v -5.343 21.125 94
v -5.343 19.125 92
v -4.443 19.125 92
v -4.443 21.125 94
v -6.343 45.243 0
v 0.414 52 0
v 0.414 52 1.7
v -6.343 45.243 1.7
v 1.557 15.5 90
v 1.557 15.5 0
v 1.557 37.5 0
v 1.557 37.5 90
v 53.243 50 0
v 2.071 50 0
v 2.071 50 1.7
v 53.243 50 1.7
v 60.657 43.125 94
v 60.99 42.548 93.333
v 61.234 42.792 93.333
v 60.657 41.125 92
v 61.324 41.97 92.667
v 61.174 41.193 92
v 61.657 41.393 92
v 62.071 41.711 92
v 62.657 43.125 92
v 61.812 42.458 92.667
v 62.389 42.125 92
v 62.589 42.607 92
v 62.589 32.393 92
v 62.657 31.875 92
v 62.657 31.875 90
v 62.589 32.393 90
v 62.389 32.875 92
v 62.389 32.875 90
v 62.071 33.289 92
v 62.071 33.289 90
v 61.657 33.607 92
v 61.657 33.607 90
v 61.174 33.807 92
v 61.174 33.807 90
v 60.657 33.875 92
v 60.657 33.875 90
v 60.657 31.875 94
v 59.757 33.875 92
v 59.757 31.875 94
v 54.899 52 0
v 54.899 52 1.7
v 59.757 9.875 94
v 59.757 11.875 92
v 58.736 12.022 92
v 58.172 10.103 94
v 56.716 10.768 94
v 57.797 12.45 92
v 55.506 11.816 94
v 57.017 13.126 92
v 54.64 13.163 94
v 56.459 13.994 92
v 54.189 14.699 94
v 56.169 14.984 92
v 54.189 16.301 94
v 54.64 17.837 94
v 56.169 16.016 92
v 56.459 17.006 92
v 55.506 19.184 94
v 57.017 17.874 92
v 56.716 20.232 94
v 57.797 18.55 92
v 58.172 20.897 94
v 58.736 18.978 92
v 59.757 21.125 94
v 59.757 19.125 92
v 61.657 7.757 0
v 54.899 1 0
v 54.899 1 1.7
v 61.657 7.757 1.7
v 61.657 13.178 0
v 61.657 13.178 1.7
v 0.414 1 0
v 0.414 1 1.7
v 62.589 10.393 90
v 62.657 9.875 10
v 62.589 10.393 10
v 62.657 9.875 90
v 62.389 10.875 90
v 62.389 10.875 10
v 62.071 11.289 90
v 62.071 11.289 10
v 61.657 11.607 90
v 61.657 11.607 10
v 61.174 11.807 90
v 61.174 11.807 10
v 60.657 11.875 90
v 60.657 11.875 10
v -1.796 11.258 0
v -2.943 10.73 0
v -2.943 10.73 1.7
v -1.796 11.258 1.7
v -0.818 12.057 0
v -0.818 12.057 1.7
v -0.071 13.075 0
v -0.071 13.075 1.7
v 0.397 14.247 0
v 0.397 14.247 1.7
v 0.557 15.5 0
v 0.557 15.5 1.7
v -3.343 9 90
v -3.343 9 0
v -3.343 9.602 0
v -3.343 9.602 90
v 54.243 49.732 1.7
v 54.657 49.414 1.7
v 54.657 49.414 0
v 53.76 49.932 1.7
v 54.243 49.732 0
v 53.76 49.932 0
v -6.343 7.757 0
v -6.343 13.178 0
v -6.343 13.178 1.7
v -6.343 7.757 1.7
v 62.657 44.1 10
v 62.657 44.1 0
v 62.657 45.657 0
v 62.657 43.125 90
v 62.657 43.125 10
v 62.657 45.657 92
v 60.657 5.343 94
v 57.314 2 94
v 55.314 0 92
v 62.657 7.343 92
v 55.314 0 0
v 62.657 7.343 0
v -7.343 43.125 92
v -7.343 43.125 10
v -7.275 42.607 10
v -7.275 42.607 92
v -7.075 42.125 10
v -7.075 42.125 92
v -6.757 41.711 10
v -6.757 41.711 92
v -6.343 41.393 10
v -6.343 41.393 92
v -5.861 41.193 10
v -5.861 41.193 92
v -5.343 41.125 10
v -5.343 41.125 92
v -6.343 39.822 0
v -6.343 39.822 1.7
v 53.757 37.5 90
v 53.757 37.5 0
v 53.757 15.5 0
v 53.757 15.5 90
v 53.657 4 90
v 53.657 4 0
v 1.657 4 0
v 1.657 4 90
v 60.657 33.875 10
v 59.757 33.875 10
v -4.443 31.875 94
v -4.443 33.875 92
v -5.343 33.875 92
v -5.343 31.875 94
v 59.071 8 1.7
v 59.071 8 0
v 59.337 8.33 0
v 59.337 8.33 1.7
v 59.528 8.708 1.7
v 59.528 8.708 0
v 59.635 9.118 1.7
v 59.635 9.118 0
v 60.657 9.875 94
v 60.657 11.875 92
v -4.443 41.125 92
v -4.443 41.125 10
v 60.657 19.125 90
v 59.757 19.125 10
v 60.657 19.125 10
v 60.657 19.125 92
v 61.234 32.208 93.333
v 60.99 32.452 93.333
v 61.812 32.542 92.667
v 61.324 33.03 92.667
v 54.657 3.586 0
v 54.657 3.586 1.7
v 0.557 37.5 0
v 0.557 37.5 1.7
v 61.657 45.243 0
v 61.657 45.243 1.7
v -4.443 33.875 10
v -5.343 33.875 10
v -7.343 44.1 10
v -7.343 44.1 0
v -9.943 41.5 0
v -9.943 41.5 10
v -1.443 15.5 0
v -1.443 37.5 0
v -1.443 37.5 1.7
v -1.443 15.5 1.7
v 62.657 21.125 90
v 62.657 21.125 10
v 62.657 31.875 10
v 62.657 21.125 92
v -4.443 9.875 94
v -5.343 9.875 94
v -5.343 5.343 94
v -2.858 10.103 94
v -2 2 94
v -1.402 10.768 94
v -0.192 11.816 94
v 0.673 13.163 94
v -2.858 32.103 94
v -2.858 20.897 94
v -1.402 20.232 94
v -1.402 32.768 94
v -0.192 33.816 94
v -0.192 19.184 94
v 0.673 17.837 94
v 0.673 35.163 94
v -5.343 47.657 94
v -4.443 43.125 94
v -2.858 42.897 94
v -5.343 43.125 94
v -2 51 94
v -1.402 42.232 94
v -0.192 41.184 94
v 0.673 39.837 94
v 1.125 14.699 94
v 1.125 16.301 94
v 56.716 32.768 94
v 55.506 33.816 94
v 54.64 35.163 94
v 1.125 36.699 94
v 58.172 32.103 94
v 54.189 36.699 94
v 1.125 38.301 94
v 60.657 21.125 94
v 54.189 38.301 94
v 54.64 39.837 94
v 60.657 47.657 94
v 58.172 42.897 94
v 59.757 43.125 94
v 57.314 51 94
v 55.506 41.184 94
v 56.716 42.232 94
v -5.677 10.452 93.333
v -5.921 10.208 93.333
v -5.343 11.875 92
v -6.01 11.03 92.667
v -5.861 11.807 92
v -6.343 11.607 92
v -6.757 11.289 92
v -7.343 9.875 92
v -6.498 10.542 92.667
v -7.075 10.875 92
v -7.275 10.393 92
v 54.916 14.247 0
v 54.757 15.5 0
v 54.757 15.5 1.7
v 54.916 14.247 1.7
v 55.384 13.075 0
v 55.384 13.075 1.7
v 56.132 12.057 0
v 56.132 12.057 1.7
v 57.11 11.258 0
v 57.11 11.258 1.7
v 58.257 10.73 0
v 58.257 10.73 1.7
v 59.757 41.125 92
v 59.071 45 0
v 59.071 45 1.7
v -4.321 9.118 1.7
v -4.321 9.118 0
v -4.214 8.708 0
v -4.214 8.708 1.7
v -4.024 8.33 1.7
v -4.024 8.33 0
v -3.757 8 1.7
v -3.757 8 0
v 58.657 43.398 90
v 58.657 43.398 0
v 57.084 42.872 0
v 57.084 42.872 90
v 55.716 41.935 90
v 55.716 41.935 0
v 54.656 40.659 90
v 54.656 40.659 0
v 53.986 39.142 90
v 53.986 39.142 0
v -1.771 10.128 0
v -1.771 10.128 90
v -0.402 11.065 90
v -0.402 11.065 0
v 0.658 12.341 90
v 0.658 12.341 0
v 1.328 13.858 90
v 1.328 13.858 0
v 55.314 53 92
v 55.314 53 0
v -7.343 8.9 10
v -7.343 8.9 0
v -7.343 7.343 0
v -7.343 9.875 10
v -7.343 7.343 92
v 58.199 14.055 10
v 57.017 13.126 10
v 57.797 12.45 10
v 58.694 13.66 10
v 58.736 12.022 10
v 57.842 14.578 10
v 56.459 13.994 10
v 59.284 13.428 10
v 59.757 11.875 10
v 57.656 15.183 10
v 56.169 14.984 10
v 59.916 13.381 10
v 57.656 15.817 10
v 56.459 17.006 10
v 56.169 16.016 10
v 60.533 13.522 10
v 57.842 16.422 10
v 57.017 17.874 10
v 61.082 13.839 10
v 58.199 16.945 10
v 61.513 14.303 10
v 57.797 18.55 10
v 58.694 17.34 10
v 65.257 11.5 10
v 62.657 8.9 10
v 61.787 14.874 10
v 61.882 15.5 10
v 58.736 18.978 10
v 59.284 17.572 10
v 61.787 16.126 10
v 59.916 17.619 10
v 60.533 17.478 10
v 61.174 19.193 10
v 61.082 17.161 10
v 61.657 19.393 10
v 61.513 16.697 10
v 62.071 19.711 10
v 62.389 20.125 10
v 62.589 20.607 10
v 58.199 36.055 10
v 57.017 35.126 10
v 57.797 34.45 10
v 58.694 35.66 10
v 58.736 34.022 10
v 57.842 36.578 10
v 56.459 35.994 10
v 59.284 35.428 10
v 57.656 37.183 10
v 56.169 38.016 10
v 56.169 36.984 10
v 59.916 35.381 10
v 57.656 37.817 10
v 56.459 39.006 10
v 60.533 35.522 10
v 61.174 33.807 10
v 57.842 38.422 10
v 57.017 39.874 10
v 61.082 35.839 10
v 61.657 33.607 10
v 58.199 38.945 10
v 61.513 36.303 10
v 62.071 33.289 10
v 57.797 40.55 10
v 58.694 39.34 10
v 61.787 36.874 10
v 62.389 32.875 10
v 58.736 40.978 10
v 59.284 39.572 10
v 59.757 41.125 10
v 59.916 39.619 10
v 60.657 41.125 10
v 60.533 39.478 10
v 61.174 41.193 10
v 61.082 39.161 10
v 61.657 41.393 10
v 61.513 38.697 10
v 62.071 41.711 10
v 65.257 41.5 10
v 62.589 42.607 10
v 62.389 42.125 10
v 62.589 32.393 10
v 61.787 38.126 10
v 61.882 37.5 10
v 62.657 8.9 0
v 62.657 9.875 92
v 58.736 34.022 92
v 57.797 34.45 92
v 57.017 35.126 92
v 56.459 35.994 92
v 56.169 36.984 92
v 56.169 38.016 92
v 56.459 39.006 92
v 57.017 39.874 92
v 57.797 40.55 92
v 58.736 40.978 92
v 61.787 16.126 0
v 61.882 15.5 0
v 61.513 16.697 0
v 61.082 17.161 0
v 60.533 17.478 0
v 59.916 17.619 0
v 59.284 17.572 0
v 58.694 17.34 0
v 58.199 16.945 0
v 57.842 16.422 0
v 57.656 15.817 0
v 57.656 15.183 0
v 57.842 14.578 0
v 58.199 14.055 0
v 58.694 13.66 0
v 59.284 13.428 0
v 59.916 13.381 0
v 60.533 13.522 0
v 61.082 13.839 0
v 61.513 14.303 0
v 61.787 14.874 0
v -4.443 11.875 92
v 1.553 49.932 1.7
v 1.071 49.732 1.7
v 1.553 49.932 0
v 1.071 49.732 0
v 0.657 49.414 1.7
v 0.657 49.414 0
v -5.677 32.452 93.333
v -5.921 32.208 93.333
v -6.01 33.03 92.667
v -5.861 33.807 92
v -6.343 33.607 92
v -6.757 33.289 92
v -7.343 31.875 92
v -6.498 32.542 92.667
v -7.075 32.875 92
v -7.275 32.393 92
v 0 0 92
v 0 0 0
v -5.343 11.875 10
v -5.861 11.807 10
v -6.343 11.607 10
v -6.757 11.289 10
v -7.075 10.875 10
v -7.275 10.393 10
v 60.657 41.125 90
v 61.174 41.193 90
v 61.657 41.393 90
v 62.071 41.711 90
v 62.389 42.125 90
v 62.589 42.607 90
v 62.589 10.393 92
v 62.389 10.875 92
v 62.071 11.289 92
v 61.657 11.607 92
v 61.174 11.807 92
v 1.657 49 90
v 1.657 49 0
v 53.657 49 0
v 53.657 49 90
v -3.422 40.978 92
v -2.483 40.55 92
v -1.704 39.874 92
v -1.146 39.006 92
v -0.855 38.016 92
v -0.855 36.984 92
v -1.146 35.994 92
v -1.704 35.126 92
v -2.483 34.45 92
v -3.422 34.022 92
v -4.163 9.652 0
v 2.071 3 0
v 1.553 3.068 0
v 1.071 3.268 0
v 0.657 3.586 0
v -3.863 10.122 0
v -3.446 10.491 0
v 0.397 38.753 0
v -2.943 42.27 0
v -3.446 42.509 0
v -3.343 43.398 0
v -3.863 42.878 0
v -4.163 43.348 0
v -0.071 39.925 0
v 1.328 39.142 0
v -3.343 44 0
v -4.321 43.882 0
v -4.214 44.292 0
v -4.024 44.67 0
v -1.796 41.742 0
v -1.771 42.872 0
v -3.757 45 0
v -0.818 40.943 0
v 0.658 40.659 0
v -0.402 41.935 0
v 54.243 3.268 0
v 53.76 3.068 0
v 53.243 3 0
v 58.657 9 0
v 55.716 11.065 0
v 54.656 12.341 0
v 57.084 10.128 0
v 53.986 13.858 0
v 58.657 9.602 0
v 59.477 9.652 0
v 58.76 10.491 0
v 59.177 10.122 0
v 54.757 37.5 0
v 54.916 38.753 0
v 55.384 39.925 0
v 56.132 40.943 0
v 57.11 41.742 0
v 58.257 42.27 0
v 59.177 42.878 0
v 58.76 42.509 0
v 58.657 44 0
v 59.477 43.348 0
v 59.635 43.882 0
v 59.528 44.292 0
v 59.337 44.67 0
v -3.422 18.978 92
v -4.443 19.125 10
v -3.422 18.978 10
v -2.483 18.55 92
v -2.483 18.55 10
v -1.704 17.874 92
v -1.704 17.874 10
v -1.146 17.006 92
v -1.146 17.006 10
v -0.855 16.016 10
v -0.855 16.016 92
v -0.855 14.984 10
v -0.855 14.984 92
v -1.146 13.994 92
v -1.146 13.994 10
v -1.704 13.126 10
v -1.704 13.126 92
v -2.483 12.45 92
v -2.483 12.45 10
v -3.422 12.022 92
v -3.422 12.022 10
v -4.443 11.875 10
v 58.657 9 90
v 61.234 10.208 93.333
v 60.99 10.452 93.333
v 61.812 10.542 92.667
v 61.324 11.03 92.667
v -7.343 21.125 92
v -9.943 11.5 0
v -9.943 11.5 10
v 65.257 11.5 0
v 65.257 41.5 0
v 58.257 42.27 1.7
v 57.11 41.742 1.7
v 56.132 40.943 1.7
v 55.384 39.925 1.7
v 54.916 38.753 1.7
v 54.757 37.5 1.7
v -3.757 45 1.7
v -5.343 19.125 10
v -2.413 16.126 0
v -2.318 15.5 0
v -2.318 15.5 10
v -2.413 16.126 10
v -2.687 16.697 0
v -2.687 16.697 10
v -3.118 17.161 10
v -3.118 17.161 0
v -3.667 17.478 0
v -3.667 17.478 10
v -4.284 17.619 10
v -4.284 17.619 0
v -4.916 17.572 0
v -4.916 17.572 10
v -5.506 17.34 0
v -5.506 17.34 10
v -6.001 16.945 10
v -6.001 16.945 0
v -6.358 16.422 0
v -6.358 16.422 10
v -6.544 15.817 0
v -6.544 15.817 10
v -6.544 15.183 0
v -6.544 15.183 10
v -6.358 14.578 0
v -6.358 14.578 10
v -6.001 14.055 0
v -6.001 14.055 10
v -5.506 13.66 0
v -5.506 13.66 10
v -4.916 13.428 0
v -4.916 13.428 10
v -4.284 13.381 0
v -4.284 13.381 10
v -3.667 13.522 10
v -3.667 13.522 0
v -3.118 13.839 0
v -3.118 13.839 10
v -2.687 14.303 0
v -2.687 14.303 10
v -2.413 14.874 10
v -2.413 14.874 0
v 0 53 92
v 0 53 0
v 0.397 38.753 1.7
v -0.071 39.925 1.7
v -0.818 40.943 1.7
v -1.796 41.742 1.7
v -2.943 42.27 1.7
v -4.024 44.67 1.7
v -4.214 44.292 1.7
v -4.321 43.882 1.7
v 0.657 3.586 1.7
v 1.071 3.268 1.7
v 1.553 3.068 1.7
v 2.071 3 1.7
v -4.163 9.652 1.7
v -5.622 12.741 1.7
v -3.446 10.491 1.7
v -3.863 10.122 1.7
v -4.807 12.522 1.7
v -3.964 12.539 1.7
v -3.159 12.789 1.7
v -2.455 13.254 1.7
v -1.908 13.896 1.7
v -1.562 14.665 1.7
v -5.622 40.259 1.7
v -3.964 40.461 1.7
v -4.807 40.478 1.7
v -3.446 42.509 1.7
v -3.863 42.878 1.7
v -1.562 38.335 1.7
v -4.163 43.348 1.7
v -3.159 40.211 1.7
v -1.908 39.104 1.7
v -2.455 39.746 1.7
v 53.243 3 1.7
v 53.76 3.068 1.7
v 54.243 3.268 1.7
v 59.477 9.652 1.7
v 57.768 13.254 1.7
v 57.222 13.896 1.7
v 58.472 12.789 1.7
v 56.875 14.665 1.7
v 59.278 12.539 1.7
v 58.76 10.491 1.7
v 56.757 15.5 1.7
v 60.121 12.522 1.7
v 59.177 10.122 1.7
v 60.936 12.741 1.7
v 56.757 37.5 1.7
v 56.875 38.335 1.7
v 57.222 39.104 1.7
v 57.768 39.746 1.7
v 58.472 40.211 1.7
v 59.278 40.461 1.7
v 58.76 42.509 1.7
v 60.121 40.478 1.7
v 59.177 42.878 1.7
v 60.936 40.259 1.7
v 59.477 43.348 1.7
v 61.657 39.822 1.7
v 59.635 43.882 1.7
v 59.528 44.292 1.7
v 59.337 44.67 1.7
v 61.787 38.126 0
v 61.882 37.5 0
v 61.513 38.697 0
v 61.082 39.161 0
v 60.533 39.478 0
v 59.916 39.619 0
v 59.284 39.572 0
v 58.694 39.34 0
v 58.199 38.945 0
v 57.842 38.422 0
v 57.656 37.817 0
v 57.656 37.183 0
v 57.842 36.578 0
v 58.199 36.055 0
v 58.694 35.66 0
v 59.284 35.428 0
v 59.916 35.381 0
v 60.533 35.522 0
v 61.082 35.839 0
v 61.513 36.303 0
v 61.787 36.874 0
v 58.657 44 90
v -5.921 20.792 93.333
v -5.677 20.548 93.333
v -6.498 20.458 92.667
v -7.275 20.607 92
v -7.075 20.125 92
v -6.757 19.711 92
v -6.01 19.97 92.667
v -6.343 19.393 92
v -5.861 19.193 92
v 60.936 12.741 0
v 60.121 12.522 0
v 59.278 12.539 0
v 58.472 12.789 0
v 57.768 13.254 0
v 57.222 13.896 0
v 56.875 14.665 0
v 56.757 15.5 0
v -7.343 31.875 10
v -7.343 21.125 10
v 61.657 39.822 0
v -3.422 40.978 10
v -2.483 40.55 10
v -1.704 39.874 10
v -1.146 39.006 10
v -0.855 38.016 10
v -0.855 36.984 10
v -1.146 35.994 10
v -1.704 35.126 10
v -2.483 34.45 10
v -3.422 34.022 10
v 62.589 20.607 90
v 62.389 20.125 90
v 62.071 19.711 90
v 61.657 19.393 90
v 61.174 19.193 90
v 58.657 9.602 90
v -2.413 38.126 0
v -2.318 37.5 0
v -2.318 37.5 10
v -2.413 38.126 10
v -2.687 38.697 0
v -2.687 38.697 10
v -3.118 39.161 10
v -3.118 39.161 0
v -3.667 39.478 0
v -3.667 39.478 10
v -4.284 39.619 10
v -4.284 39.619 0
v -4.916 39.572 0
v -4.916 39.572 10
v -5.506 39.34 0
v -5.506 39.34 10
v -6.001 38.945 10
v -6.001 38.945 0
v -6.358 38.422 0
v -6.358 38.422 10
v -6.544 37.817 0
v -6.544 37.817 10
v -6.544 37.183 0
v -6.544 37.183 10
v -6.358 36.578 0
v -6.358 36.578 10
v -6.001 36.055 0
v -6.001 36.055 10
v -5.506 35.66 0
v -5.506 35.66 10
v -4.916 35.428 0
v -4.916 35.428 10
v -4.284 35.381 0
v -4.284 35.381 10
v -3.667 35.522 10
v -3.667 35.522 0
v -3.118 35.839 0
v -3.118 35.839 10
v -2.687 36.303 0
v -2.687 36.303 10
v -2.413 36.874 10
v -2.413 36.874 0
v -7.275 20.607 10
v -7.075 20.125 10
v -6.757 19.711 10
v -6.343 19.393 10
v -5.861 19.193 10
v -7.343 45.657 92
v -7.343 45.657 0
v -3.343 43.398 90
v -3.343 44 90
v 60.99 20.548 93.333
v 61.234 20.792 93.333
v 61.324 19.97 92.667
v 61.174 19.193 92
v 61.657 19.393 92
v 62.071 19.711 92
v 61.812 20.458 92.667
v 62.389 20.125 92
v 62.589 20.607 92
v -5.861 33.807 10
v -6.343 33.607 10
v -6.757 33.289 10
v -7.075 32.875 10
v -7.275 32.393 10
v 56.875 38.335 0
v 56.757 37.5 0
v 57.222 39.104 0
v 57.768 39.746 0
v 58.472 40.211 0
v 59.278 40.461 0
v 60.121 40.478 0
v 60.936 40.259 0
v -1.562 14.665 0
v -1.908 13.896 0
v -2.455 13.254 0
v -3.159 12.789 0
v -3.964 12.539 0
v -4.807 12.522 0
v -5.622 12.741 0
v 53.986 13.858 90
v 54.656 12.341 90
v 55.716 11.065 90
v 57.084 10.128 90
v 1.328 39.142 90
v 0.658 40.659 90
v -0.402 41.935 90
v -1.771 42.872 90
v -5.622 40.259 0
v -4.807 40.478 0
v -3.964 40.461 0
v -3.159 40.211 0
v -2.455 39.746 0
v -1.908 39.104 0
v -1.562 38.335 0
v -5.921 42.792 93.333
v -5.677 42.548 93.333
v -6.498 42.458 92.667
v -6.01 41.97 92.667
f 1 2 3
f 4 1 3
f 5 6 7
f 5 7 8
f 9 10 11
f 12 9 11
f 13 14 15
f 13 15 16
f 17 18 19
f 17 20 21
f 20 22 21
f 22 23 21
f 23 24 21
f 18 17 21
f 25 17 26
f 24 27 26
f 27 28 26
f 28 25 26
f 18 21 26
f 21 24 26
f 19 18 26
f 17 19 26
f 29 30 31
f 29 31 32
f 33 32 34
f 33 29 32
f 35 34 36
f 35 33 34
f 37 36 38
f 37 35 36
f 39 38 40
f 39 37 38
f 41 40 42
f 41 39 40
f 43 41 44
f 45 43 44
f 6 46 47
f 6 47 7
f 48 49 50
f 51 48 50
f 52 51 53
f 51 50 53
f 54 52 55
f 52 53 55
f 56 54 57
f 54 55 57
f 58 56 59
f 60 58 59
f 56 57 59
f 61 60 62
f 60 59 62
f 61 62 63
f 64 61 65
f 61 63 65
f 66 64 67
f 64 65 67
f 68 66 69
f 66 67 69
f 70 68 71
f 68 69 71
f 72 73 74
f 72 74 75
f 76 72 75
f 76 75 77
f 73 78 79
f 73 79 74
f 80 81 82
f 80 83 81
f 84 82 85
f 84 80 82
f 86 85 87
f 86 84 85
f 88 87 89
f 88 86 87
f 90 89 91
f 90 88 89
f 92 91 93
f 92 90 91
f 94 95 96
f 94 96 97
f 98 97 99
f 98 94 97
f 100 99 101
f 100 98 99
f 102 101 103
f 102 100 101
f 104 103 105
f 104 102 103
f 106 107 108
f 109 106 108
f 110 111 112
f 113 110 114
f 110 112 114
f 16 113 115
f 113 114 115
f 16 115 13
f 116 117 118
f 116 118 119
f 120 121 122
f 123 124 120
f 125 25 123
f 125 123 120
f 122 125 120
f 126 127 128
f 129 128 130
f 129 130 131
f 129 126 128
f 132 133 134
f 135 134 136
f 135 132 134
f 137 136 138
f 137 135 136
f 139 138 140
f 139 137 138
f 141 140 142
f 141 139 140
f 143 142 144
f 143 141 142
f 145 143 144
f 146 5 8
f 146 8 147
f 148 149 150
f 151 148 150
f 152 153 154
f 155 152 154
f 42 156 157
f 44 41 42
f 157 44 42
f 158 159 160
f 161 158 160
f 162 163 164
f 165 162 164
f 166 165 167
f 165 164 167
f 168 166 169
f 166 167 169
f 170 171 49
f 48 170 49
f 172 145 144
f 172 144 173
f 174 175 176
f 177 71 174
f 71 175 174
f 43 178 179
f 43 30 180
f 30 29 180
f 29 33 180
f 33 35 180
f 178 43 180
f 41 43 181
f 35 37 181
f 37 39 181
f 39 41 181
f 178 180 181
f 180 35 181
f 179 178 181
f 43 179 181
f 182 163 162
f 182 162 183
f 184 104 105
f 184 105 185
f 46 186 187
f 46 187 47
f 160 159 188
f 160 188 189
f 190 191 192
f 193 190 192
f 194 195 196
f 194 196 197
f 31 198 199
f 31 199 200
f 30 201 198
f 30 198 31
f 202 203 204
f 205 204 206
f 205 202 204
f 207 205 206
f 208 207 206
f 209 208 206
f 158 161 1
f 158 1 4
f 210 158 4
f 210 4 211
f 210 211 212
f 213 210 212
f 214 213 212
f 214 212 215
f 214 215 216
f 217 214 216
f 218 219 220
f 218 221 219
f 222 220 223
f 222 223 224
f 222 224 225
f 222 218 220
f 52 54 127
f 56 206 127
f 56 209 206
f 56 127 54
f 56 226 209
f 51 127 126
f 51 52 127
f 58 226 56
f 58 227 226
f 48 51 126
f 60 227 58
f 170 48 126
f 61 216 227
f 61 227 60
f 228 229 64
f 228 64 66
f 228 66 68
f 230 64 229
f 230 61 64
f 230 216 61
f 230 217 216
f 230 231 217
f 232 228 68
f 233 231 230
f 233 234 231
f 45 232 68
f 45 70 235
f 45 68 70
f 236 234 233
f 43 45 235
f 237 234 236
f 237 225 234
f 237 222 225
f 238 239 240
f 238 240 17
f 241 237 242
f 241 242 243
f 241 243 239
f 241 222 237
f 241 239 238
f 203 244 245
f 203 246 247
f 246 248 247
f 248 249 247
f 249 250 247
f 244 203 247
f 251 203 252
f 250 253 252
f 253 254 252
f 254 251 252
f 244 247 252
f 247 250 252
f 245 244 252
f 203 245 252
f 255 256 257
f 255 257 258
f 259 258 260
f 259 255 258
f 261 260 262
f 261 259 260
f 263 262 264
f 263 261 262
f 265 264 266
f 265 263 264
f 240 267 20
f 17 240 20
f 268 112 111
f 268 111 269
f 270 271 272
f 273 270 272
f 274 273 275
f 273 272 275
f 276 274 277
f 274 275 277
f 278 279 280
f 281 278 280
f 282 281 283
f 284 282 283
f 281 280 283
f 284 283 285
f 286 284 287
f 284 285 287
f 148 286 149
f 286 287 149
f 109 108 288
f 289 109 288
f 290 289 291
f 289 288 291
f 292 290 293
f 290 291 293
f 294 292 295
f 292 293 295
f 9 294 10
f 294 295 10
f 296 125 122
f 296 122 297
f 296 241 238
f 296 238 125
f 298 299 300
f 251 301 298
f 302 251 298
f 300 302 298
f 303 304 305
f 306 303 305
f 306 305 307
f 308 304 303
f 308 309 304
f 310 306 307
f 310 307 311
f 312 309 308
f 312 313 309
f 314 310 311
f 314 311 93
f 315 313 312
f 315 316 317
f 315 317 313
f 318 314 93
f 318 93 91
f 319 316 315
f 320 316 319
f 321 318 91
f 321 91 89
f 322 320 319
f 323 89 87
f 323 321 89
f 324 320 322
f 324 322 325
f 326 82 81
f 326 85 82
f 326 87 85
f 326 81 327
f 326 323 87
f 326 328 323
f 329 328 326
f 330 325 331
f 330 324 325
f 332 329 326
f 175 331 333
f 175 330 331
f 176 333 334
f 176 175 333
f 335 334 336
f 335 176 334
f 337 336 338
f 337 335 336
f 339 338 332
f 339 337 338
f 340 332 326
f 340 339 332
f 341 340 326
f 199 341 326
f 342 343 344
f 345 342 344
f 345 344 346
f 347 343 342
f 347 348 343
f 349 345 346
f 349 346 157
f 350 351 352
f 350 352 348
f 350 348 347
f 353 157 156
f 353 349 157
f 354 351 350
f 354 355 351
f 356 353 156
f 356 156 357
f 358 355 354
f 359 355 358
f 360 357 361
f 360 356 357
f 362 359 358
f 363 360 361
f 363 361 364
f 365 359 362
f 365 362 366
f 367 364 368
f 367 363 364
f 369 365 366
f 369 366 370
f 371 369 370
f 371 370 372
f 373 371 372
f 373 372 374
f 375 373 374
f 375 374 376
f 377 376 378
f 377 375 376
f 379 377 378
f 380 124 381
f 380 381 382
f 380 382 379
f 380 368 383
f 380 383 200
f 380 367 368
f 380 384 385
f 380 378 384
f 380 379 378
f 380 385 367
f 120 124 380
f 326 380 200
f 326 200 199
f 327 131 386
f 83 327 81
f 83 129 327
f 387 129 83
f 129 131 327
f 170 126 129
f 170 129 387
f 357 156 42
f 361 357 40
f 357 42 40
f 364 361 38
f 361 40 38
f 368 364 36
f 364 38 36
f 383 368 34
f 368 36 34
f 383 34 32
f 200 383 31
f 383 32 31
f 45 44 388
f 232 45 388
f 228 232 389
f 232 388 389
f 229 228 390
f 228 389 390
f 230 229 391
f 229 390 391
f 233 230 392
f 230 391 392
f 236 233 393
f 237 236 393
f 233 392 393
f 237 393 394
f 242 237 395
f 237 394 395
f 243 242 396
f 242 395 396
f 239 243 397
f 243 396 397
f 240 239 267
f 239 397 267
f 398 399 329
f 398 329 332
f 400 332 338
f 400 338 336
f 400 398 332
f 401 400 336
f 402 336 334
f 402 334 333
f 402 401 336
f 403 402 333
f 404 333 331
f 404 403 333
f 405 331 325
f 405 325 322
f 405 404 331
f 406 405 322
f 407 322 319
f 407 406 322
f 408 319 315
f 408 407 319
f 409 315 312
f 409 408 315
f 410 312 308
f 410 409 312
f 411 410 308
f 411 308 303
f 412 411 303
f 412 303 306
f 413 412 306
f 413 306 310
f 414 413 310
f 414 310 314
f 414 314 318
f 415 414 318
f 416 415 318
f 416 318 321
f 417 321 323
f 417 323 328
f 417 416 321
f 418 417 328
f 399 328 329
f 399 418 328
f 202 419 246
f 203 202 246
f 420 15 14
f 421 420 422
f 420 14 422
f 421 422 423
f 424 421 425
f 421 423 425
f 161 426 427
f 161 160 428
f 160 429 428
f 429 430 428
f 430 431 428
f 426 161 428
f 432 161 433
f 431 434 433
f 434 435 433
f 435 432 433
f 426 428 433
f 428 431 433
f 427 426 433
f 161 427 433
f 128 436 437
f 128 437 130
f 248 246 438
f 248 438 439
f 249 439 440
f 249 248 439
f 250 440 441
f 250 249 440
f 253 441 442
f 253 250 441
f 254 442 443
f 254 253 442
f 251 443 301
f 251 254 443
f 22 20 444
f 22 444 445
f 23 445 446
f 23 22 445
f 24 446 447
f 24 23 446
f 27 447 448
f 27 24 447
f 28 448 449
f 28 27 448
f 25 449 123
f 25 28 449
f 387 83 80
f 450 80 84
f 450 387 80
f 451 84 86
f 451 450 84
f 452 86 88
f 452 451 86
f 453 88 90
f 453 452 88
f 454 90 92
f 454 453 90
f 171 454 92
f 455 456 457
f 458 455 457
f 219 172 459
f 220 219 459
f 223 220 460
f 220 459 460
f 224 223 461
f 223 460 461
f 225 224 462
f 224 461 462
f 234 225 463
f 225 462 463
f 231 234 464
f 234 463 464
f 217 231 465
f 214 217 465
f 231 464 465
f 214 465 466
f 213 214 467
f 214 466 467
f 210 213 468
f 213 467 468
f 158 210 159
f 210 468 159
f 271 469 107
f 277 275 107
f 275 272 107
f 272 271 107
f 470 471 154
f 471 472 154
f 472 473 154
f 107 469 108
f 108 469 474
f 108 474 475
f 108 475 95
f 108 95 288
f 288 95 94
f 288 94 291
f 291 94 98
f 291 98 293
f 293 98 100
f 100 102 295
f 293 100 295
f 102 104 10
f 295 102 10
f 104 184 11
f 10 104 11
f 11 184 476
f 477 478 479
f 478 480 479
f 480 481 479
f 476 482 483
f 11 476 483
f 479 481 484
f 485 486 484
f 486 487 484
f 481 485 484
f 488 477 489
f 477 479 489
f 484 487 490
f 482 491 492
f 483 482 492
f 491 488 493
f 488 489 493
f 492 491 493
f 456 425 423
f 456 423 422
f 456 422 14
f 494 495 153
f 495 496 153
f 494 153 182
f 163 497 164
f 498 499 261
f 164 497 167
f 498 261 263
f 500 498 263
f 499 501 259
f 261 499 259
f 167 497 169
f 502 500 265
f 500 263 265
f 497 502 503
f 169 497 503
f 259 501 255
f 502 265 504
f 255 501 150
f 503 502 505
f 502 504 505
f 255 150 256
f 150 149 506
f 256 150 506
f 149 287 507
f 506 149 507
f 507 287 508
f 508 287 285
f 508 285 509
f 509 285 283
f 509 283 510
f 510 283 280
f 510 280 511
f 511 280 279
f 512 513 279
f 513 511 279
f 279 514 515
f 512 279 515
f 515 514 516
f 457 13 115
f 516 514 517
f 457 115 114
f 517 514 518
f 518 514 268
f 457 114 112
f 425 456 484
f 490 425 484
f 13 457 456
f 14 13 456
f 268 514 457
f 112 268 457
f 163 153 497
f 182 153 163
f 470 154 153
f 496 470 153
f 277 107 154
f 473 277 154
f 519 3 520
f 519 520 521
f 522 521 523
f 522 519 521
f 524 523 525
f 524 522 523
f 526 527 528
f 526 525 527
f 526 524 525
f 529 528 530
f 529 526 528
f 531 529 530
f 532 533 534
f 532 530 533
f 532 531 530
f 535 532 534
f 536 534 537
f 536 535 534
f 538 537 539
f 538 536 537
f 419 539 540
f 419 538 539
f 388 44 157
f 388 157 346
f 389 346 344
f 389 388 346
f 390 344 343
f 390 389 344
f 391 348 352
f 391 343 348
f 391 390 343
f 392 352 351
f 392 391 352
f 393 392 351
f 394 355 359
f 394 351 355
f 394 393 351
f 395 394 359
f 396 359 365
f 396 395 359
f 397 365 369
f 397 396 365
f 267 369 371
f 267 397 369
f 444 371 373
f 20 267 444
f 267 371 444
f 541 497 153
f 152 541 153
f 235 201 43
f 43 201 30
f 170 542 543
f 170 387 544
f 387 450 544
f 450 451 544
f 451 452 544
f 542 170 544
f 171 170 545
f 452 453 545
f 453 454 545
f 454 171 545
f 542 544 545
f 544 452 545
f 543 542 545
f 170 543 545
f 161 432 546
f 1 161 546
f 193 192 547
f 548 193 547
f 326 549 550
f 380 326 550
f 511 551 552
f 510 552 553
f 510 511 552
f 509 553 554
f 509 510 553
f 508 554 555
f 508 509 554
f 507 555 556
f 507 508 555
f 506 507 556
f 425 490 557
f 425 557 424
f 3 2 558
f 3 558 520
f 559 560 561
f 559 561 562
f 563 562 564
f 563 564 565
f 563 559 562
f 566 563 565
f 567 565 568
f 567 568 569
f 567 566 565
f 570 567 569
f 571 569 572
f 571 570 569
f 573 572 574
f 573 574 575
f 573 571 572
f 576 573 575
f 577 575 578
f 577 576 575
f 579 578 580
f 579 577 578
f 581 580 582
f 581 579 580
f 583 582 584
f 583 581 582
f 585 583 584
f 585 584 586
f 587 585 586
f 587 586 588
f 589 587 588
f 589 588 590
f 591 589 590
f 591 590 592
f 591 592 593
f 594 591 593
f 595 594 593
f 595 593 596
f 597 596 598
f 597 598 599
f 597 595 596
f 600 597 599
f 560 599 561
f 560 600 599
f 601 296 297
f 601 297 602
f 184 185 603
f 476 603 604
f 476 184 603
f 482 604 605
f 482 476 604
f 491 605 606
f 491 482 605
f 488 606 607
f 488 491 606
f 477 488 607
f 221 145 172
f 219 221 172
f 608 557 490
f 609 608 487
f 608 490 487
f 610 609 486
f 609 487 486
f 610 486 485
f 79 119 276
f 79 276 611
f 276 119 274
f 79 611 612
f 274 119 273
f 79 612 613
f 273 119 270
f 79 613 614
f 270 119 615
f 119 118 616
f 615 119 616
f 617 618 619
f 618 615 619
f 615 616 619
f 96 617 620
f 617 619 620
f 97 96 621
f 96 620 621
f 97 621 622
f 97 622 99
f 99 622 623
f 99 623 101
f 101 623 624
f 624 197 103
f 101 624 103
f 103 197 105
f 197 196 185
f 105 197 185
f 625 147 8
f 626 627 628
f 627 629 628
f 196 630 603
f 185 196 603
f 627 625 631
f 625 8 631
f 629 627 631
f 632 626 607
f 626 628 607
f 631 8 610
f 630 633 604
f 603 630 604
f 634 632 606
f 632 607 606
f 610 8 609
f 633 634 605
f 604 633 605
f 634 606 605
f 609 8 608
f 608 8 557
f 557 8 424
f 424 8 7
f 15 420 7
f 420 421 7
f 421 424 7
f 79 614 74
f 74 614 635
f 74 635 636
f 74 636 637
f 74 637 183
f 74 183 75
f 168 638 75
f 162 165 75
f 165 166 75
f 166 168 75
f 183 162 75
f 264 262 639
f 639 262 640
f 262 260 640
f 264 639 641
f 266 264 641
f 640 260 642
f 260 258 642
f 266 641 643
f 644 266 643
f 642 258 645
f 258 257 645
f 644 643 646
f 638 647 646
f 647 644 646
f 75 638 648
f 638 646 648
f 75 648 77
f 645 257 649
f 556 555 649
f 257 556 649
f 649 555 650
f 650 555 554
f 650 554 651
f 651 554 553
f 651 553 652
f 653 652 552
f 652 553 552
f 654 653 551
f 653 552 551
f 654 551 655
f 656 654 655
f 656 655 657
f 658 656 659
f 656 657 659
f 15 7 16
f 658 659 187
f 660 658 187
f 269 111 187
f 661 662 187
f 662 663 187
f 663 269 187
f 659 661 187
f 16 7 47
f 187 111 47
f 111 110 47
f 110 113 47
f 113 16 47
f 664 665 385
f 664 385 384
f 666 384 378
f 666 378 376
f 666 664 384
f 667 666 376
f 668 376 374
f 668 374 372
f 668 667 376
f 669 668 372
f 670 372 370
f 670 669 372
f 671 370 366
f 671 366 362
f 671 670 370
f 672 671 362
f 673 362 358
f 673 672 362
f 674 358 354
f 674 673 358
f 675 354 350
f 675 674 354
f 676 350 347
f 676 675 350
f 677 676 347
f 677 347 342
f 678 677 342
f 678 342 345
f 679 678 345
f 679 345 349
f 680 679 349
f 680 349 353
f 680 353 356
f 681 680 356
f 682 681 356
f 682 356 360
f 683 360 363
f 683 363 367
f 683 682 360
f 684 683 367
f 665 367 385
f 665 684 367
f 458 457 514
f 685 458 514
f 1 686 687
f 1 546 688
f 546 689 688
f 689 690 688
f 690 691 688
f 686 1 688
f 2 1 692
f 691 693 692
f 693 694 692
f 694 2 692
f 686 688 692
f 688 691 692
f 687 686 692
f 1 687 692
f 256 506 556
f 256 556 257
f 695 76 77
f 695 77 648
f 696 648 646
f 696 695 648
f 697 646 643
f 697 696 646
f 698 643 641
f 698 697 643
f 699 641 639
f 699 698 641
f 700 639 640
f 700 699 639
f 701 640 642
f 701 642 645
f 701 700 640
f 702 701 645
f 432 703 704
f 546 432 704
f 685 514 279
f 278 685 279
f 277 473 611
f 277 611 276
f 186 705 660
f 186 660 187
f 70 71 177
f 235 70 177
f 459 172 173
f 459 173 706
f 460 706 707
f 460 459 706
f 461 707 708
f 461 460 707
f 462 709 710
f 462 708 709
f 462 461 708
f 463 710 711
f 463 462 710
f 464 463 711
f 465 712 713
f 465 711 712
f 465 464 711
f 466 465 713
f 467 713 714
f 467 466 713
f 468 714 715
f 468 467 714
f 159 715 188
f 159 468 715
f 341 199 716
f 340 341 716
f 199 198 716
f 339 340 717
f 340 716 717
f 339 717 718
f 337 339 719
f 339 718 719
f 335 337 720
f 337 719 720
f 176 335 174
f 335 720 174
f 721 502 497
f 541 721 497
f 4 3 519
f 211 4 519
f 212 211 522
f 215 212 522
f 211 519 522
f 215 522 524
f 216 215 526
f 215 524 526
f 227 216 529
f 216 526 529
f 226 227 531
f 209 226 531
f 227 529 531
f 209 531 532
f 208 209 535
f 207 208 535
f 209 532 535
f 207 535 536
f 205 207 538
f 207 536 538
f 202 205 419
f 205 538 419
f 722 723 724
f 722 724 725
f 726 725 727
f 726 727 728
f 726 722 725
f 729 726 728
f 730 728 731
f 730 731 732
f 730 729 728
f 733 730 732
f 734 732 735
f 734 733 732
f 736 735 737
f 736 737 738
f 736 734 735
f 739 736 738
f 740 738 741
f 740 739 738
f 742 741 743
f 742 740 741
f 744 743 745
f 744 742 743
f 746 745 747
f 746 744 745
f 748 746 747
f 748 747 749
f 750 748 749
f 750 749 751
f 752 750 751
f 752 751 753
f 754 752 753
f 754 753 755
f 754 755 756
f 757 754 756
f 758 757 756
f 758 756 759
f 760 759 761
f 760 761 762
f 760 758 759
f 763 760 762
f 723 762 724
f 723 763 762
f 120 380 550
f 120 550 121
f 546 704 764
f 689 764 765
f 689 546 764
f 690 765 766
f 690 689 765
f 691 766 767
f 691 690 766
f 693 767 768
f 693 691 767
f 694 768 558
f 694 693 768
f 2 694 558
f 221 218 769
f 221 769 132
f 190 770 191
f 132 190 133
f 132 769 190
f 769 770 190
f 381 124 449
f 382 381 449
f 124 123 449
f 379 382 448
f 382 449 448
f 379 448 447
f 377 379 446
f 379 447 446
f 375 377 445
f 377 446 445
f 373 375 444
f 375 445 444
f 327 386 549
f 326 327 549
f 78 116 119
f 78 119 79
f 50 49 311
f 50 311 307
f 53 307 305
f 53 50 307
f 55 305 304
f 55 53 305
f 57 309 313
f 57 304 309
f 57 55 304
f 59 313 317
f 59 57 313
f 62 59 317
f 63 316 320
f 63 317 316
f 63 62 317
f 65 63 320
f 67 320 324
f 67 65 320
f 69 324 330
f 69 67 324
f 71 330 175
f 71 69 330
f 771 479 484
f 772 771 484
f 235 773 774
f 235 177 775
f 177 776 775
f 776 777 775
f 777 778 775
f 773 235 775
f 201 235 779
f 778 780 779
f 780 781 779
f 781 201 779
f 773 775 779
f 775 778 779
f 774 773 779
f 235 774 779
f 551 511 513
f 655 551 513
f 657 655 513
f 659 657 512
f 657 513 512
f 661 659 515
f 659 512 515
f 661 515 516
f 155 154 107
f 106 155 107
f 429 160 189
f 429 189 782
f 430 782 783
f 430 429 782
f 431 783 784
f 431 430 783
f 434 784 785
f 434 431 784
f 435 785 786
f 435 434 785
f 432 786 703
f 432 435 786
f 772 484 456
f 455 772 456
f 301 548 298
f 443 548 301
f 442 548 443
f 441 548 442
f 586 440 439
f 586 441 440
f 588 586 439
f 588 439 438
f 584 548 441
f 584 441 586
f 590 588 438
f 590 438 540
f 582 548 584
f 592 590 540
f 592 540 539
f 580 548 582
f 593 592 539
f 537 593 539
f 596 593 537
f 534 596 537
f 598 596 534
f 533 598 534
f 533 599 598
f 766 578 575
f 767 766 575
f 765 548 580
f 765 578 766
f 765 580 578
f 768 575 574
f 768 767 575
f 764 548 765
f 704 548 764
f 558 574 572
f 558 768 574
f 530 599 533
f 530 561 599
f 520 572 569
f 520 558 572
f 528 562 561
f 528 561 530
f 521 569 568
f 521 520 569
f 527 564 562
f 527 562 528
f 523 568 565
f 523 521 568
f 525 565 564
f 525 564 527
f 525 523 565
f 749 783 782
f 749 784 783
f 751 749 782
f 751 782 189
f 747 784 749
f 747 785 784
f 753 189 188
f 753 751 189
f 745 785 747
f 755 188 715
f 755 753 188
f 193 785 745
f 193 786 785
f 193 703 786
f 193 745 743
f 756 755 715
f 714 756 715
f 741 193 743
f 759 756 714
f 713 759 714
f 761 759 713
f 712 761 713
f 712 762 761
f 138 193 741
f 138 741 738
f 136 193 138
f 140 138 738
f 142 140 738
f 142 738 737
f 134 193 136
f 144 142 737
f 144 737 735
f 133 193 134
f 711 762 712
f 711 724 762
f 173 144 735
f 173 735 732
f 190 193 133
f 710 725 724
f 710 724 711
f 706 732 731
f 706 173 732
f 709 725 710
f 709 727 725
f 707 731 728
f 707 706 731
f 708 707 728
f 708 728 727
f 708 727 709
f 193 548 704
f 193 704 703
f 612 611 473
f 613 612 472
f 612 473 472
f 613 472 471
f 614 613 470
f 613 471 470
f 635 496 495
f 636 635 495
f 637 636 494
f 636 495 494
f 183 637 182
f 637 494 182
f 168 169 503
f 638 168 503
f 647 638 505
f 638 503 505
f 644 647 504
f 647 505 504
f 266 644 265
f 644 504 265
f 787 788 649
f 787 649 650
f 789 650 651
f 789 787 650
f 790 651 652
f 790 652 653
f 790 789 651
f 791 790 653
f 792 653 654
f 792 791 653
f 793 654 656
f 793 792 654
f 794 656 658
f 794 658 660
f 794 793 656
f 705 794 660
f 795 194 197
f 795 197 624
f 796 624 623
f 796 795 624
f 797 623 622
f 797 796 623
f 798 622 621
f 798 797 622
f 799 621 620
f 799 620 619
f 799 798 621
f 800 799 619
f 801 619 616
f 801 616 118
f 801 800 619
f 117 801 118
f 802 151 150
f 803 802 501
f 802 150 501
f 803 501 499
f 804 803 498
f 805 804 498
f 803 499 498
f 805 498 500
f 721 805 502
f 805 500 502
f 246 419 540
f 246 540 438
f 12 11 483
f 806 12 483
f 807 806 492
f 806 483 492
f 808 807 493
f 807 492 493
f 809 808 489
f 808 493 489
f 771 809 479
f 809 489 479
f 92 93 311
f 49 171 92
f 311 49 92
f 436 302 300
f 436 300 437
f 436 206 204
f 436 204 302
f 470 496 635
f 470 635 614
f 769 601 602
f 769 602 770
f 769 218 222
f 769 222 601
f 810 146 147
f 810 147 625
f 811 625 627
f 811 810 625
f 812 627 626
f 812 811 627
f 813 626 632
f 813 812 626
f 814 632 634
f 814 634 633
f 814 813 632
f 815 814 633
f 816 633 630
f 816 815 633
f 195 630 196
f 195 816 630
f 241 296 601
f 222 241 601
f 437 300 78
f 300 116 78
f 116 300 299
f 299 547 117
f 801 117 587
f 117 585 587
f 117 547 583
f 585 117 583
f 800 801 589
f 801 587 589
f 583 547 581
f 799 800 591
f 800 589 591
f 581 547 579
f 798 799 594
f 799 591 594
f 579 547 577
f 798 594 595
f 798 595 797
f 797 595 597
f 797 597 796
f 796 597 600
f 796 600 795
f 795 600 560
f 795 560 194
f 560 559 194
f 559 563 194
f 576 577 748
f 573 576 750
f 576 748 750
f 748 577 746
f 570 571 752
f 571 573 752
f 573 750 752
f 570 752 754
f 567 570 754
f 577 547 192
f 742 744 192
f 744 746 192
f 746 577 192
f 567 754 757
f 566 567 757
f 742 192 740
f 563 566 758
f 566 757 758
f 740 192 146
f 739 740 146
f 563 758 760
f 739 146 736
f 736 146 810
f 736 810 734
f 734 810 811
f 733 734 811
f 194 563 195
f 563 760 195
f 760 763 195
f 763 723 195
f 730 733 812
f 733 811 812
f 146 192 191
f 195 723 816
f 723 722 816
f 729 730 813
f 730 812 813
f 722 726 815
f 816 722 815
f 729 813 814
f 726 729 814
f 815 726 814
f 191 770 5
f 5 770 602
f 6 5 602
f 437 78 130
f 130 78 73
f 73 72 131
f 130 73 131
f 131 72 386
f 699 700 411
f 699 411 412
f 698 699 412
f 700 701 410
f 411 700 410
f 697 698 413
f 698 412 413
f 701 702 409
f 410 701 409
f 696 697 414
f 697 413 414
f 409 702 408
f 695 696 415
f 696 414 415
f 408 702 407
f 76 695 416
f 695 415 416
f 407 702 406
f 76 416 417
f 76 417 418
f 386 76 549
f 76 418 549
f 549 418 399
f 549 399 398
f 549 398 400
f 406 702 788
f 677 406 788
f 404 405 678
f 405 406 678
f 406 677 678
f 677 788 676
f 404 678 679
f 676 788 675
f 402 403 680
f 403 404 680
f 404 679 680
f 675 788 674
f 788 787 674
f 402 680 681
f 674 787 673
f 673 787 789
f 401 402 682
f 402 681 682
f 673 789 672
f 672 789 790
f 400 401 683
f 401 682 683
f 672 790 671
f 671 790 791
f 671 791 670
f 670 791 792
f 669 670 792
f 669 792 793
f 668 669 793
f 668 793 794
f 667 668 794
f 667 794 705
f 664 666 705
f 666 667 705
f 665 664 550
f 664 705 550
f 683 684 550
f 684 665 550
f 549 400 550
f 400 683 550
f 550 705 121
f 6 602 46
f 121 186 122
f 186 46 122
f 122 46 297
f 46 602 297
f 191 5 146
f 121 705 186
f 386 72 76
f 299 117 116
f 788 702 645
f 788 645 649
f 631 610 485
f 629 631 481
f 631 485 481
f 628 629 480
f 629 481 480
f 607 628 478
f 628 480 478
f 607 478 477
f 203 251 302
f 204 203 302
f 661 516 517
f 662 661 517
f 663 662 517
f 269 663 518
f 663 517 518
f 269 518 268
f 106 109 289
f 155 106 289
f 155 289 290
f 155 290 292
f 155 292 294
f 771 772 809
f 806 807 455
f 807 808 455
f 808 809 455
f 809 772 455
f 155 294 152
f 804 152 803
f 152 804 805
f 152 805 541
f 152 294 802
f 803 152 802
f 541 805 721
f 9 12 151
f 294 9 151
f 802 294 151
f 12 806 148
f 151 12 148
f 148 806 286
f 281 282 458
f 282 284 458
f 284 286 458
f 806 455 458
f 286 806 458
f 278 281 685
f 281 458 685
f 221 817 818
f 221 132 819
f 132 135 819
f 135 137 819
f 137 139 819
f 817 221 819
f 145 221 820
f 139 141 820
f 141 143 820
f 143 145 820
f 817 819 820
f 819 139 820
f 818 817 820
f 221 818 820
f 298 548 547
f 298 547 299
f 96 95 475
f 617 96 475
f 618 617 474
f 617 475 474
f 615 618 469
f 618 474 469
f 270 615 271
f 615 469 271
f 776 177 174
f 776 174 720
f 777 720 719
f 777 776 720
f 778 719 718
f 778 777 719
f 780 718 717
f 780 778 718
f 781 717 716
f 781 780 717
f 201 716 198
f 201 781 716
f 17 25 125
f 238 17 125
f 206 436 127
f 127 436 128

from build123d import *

# Parameters (mm, degrees)
BOSS_EXTRUDE1_DEPTH = 90
SKETCH1_3_R         = 2.125
BOSS_EXTRUDE2_DEPTH = 10
FILLET1_R           = 2
BOSS_EXTRUDE3_START = 4
BOSS_EXTRUDE3_DEPTH = 4
CHAMFER1_SIZE       = 2
CUT_EXTRUDE1_DEPTH  = 1.7
FILLET2_R           = 2


# Some blends are built 0.0001 mm under size
with BuildPart() as part:
    # Sketch1 → Boss-Extrude1 (new body)
    with BuildSketch(Plane.XY):
        with BuildLine():
            Line((55.313708499, 53), (0, 53))
            Line((0, 53), (-7.343145751, 45.656854249))
            Line((-7.343145751, 45.656854249), (-7.343145751, 41.125))
            Line((-7.343145751, 41.125), (-4.443145751, 41.125))
            ThreePointArc((-4.443145751, 41.125), (-0.818145751, 37.5), (-4.443145751, 33.875))
            Line((-4.443145751, 33.875), (-7.343145751, 33.875))
            Line((-7.343145751, 33.875), (-7.343145751, 19.125))
            Line((-7.343145751, 19.125), (-4.443145751, 19.125))
            ThreePointArc((-4.443145751, 19.125), (-0.818145751, 15.5), (-4.443145751, 11.875))
            Line((-4.443145751, 11.875), (-7.343145751, 11.875))
            Line((-7.343145751, 11.875), (-7.343145751, 7.343145751))
            Line((-7.343145751, 7.343145751), (0, 0))
            Line((0, 0), (55.313708499, 0))
            Line((55.313708499, 0), (62.656854249, 7.343145751))
            Line((62.656854249, 7.343145751), (62.656854249, 11.875))
            Line((62.656854249, 11.875), (59.756854249, 11.875))
            ThreePointArc((59.756854249, 11.875), (56.131854249, 15.5), (59.756854249, 19.125))
            Line((59.756854249, 19.125), (62.656854249, 19.125))
            Line((62.656854249, 19.125), (62.656854249, 33.875))
            Line((62.656854249, 33.875), (59.756854249, 33.875))
            ThreePointArc((59.756854249, 33.875), (56.131854249, 37.5), (59.756854249, 41.125))
            Line((59.756854249, 41.125), (62.656854249, 41.125))
            Line((62.656854249, 41.125), (62.656854249, 45.656854249))
            Line((62.656854249, 45.656854249), (55.313708499, 53))
        make_face()
        with BuildLine():
            Line((53.656854249, 4), (1.656854249, 4))
            Line((1.656854249, 4), (-3.343145751, 9))
            Line((-3.343145751, 9), (-3.343145751, 9.601695159))
            ThreePointArc((-3.343145751, 9.601695159), (0.172046553, 11.665942097), (1.556854249, 15.5))
            Line((1.556854249, 15.5), (1.556854249, 37.5))
            ThreePointArc((1.556854249, 37.5), (0.172046553, 41.334057903), (-3.343145751, 43.398304841))
            Line((-3.343145751, 43.398304841), (-3.343145751, 44))
            Line((-3.343145751, 44), (1.656854249, 49))
            Line((1.656854249, 49), (53.656854249, 49))
            Line((53.656854249, 49), (58.656854249, 44))
            Line((58.656854249, 44), (58.656854249, 43.398304841))
            ThreePointArc((58.656854249, 43.398304841), (55.141661946, 41.334057903), (53.756854249, 37.5))
            Line((53.756854249, 37.5), (53.756854249, 15.5))
            ThreePointArc((53.756854249, 15.5), (55.141661946, 11.665942097), (58.656854249, 9.601695159))
            Line((58.656854249, 9.601695159), (58.656854249, 9))
            Line((58.656854249, 9), (53.656854249, 4))
        make_face(mode=Mode.SUBTRACT)
    extrude(amount=BOSS_EXTRUDE1_DEPTH)

    # Sketch1<3> → Boss-Extrude2 (add)
    # profile 1 of 2: a face of its own
    with BuildSketch(Plane.XY):
        with BuildLine():
            ThreePointArc((-4.443145751, 33.875), (-0.818145751, 37.5), (-4.443145751, 41.125))
            Line((-4.443145751, 41.125), (-7.343145751, 41.125))
            Line((-7.343145751, 41.125), (-7.343145751, 44.1))
            Line((-7.343145751, 44.1), (-9.943145751, 41.5))
            Line((-9.943145751, 41.5), (-9.943145751, 11.5))
            Line((-9.943145751, 11.5), (-7.343145751, 8.9))
            Line((-7.343145751, 8.9), (-7.343145751, 11.875))
            Line((-7.343145751, 11.875), (-4.443145751, 11.875))
            ThreePointArc((-4.443145751, 11.875), (-0.818145751, 15.5), (-4.443145751, 19.125))
            Line((-4.443145751, 19.125), (-7.343145751, 19.125))
            Line((-7.343145751, 19.125), (-7.343145751, 33.875))
            Line((-7.343145751, 33.875), (-4.443145751, 33.875))
        make_face()
        with Locations((-4.443145751, 15.5)):
            Circle(SKETCH1_3_R, mode=Mode.SUBTRACT)
        with Locations((-4.443145751, 37.5)):
            Circle(SKETCH1_3_R, mode=Mode.SUBTRACT)
    # profile 2 of 2: a face of its own
    with BuildSketch(Plane.XY):
        with BuildLine():
            Line((65.256854249, 41.5), (62.656854249, 44.1))
            Line((62.656854249, 44.1), (62.656854249, 41.125))
            Line((62.656854249, 41.125), (59.756854249, 41.125))
            ThreePointArc((59.756854249, 41.125), (56.131854249, 37.5), (59.756854249, 33.875))
            Line((59.756854249, 33.875), (62.656854249, 33.875))
            Line((62.656854249, 33.875), (62.656854249, 19.125))
            Line((62.656854249, 19.125), (59.756854249, 19.125))
            ThreePointArc((59.756854249, 19.125), (56.131854249, 15.5), (59.756854249, 11.875))
            Line((59.756854249, 11.875), (62.656854249, 11.875))
            Line((62.656854249, 11.875), (62.656854249, 8.9))
            Line((62.656854249, 8.9), (65.256854249, 11.5))
            Line((65.256854249, 11.5), (65.256854249, 41.5))
        make_face()
        with Locations((59.756854249, 37.5)):
            Circle(SKETCH1_3_R, mode=Mode.SUBTRACT)
        with Locations((59.756854249, 15.5)):
            Circle(SKETCH1_3_R, mode=Mode.SUBTRACT)
    extrude(amount=BOSS_EXTRUDE2_DEPTH)

    # Fillet1
    fillet1_edges = [part.edges().sort_by_distance(p)[0] for p in [
        (62.656854249, 41.125, 50),
        (62.656854249, 33.875, 50),
        (62.656854249, 19.125, 50),
        (62.656854249, 11.875, 50),
        (-7.343145751, 11.875, 50),
        (-7.343145751, 19.125, 50),
        (-7.343145751, 33.875, 50),
        (-7.343145751, 41.125, 50),
    ]]
    fillet(fillet1_edges, radius=FILLET1_R)

    # Sketch2 → Boss-Extrude3 (add)
    with BuildSketch(Plane.XY.offset(90).offset(BOSS_EXTRUDE3_START)):
        with BuildLine():
            Line((-7.343145751, 31.875), (-7.343145751, 21.125))
            ThreePointArc((-7.343145751, 21.125), (-6.757359313, 19.710786438), (-5.343145751, 19.125))
            Line((-5.343145751, 19.125), (-4.443145751, 19.125))
            ThreePointArc((-4.443145751, 19.125), (-0.818145751, 15.5), (-4.443145751, 11.875))
            Line((-4.443145751, 11.875), (-5.343145751, 11.875))
            ThreePointArc((-5.343145751, 11.875), (-6.757359313, 11.289213562), (-7.343145751, 9.875))
            Line((-7.343145751, 9.875), (-7.343145751, 7.343145751))
            Line((-7.343145751, 7.343145751), (0, 0))
            Line((0, 0), (55.313708499, 0))
            Line((55.313708499, 0), (62.656854249, 7.343145751))
            Line((62.656854249, 7.343145751), (62.656854249, 9.875))
            ThreePointArc((62.656854249, 9.875), (62.071067812, 11.289213562), (60.656854249, 11.875))
            Line((60.656854249, 11.875), (59.756854249, 11.875))
            ThreePointArc((59.756854249, 11.875), (56.131854249, 15.5), (59.756854249, 19.125))
            Line((59.756854249, 19.125), (60.656854249, 19.125))
            ThreePointArc((60.656854249, 19.125), (62.071067812, 19.710786438), (62.656854249, 21.125))
            Line((62.656854249, 21.125), (62.656854249, 31.875))
            ThreePointArc((62.656854249, 31.875), (62.071067812, 33.289213562), (60.656854249, 33.875))
            Line((60.656854249, 33.875), (59.756854249, 33.875))
            ThreePointArc((59.756854249, 33.875), (56.131854249, 37.5), (59.756854249, 41.125))
            Line((59.756854249, 41.125), (60.656854249, 41.125))
            ThreePointArc((60.656854249, 41.125), (62.071067812, 41.710786438), (62.656854249, 43.125))
            Line((62.656854249, 43.125), (62.656854249, 45.656854249))
            Line((62.656854249, 45.656854249), (55.313708499, 53))
            Line((55.313708499, 53), (0, 53))
            Line((0, 53), (-7.343145751, 45.656854249))
            Line((-7.343145751, 45.656854249), (-7.343145751, 43.125))
            ThreePointArc((-7.343145751, 43.125), (-6.757359313, 41.710786438), (-5.343145751, 41.125))
            Line((-5.343145751, 41.125), (-4.443145751, 41.125))
            ThreePointArc((-4.443145751, 41.125), (-0.818145751, 37.5), (-4.443145751, 33.875))
            Line((-4.443145751, 33.875), (-5.343145751, 33.875))
            ThreePointArc((-5.343145751, 33.875), (-6.757359313, 33.289213562), (-7.343145751, 31.875))
        make_face()
    extrude(amount=-BOSS_EXTRUDE3_DEPTH)

    # Chamfer1
    chamfer1_edges = [part.edges().sort_by_distance(p)[0] for p in [
        (-7.343145751, 44.390927125, 94),
        (-6.757359313, 41.710786438, 94),
        (-4.893145751, 41.125, 94),
        (-0.818145751, 37.5, 94),
        (-4.893145751, 33.875, 94),
        (-6.757359313, 33.289213562, 94),
        (-7.343145751, 26.5, 94),
        (-6.757359313, 19.710786438, 94),
        (-4.893145751, 19.125, 94),
        (-0.818145751, 15.5, 94),
        (-4.893145751, 11.875, 94),
        (-6.757359313, 11.289213562, 94),
        (-7.343145751, 8.609072875, 94),
        (27.656854249, 0, 94),
        (62.656854249, 8.609072875, 94),
        (62.071067812, 11.289213562, 94),
        (60.206854249, 11.875, 94),
        (56.131854249, 15.5, 94),
        (60.206854249, 19.125, 94),
        (62.071067812, 19.710786438, 94),
        (62.656854249, 26.5, 94),
        (62.071067812, 33.289213562, 94),
        (60.206854249, 33.875, 94),
        (56.131854249, 37.5, 94),
        (60.206854249, 41.125, 94),
        (62.071067812, 41.710786438, 94),
        (62.656854249, 44.390927125, 94),
        (27.656854249, 53, 94),
    ]]
    chamfer(chamfer1_edges, length=CHAMFER1_SIZE - 0.0001)  # a hair under: the kernel refuses the full size

    # Sketch3 → Cut-Extrude1 (cut)
    with BuildSketch(Plane(origin=(0, 0, 0), x_dir=(-1, 0, 0), z_dir=(0, 0, -1))):
        with BuildLine():
            ThreePointArc((6.343145751, 39.821637353), (3.158622493, 40.211088342), (1.443145751, 37.5))
            Line((1.443145751, 37.5), (1.443145751, 15.5))
            ThreePointArc((1.443145751, 15.5), (3.158622493, 12.788911658), (6.343145751, 13.178362647))
            Line((6.343145751, 13.178362647), (6.343145751, 7.757359313))
            Line((6.343145751, 7.757359313), (-0.414213562, 1))
            Line((-0.414213562, 1), (-54.899494937, 1))
            Line((-54.899494937, 1), (-61.656854249, 7.757359313))
            Line((-61.656854249, 7.757359313), (-61.656854249, 13.178362647))
            ThreePointArc((-61.656854249, 13.178362647), (-58.472330992, 12.788911658), (-56.756854249, 15.5))
            Line((-56.756854249, 15.5), (-56.756854249, 37.5))
            ThreePointArc((-56.756854249, 37.5), (-58.472330992, 40.211088342), (-61.656854249, 39.821637353))
            Line((-61.656854249, 39.821637353), (-61.656854249, 45.242640687))
            Line((-61.656854249, 45.242640687), (-54.899494937, 52))
            Line((-54.899494937, 52), (-0.414213562, 52))
            Line((-0.414213562, 52), (6.343145751, 45.242640687))
            Line((6.343145751, 45.242640687), (6.343145751, 39.821637353))
        make_face()
        with BuildLine():
            Line((4.343145751, 42.4989999), (4.343145751, 44.414213562))
            Line((4.343145751, 44.414213562), (-1.242640687, 50))
            Line((-1.242640687, 50), (-54.071067812, 50))
            Line((-54.071067812, 50), (-59.656854249, 44.414213562))
            Line((-59.656854249, 44.414213562), (-59.656854249, 42.4989999))
            ThreePointArc((-59.656854249, 42.4989999), (-56.186140035, 41), (-54.756854249, 37.5))
            Line((-54.756854249, 37.5), (-54.756854249, 15.5))
            ThreePointArc((-54.756854249, 15.5), (-56.186140035, 12), (-59.656854249, 10.5010001))
            Line((-59.656854249, 10.5010001), (-59.656854249, 8.585786438))
            Line((-59.656854249, 8.585786438), (-54.071067812, 3))
            Line((-54.071067812, 3), (-1.242640687, 3))
            Line((-1.242640687, 3), (4.343145751, 8.585786438))
            Line((4.343145751, 8.585786438), (4.343145751, 10.5010001))
            ThreePointArc((4.343145751, 10.5010001), (0.872431536, 12), (-0.556854249, 15.5))
            Line((-0.556854249, 15.5), (-0.556854249, 37.5))
            ThreePointArc((-0.556854249, 37.5), (0.872431536, 41), (4.343145751, 42.4989999))
        make_face(mode=Mode.SUBTRACT)
    extrude(amount=-CUT_EXTRUDE1_DEPTH, mode=Mode.SUBTRACT)

    # Fillet2
    # the kernel refuses this fillet: 2 mm, written as the material it takes off along each edge
    with BuildSketch(Plane(origin=(1.242640687, 3, -2.071067812), x_dir=(1, 0, 0), z_dir=(0, 0, 1)), Plane(origin=(-4.343145751, 8.585786438, -2.071067812), x_dir=(0.7071067811865465, -0.7071067811865486, 0), z_dir=(0, 0, 1)), Plane(origin=(-4.343145751, 44.414213562, -2.071067812), x_dir=(0, -1, 0), z_dir=(0, 0, 1)), Plane(origin=(1.242640687, 50, -2.071067812), x_dir=(-0.7071067811865446, -0.7071067811865505, 0), z_dir=(0, 0, 1)), Plane(origin=(54.071067812, 50, -2.071067812), x_dir=(-1, 0, 0), z_dir=(0, 0, 1)), Plane(origin=(59.656854249, 44.414213562, -2.071067812), x_dir=(-0.7071067811865476, 0.7071067811865476, 0), z_dir=(0, 0, 1)), Plane(origin=(54.071067812, 3, -2.071067812), x_dir=(0.7071067811865448, 0.7071067811865502, 0), z_dir=(0, 0, 1)), Plane(origin=(59.656854249, 8.585786438, -2.071067812), x_dir=(0, 1, 0), z_dir=(0, 0, 1))) as fillet2_piece_1:
        with BuildLine():
            CenterArc((FILLET2_R * 0.414213562373, FILLET2_R), FILLET2_R, 225, 45)
            Line((-FILLET2_R * 0.292893218813, FILLET2_R * 0.292893218813), (0, 0))
            Line((0, 0), (FILLET2_R * 0.414213562373, 0))
        make_face()
    extrude(amount=3.771067812, mode=Mode.SUBTRACT)
    with BuildSketch(Plane(origin=(-4.343145751, 10.5010001, -4.196436275), x_dir=(0, -1, 0), z_dir=(0, 0, 1)), Plane(origin=(59.656854249, 42.4989999, -4.196436275), x_dir=(0, 1, 0), z_dir=(0, 0, 1))) as fillet2_piece_2:
        with BuildLine():
            CenterArc((1.67857451, 2), FILLET2_R, 197.457603124, 72.542396876)
            ThreePointArc((-0.229303893, 1.4), (-0.064746671, 0.70817391), (0, 0))
            Line((0, 0), (1.67857451, 0))
        make_face()
    extrude(amount=5.896436275, mode=Mode.SUBTRACT)
    with BuildSketch(Plane(origin=(-4.343145751, 42.4989999, -4.196436275), x_dir=(0.9868506458664519, -0.16163478200240997, 0), z_dir=(0, 0, 1)), Plane(origin=(59.656854249, 10.5010001, -4.196436275), x_dir=(-0.9868506458664523, 0.16163478200240763, 0), z_dir=(0, 0, 1))) as fillet2_piece_3:
        with BuildLine():
            CenterArc((1.702385267, 1.979771903), FILLET2_R, 189.301797561, 72.542396876)
            Line((-0.271316025, 1.656502339), (0, 0))
            ThreePointArc((0, 0), (0.709327194, 0.050570242), (1.418654389, 0))
        make_face()
    extrude(amount=5.896436275, mode=Mode.SUBTRACT)


solid = part.part
